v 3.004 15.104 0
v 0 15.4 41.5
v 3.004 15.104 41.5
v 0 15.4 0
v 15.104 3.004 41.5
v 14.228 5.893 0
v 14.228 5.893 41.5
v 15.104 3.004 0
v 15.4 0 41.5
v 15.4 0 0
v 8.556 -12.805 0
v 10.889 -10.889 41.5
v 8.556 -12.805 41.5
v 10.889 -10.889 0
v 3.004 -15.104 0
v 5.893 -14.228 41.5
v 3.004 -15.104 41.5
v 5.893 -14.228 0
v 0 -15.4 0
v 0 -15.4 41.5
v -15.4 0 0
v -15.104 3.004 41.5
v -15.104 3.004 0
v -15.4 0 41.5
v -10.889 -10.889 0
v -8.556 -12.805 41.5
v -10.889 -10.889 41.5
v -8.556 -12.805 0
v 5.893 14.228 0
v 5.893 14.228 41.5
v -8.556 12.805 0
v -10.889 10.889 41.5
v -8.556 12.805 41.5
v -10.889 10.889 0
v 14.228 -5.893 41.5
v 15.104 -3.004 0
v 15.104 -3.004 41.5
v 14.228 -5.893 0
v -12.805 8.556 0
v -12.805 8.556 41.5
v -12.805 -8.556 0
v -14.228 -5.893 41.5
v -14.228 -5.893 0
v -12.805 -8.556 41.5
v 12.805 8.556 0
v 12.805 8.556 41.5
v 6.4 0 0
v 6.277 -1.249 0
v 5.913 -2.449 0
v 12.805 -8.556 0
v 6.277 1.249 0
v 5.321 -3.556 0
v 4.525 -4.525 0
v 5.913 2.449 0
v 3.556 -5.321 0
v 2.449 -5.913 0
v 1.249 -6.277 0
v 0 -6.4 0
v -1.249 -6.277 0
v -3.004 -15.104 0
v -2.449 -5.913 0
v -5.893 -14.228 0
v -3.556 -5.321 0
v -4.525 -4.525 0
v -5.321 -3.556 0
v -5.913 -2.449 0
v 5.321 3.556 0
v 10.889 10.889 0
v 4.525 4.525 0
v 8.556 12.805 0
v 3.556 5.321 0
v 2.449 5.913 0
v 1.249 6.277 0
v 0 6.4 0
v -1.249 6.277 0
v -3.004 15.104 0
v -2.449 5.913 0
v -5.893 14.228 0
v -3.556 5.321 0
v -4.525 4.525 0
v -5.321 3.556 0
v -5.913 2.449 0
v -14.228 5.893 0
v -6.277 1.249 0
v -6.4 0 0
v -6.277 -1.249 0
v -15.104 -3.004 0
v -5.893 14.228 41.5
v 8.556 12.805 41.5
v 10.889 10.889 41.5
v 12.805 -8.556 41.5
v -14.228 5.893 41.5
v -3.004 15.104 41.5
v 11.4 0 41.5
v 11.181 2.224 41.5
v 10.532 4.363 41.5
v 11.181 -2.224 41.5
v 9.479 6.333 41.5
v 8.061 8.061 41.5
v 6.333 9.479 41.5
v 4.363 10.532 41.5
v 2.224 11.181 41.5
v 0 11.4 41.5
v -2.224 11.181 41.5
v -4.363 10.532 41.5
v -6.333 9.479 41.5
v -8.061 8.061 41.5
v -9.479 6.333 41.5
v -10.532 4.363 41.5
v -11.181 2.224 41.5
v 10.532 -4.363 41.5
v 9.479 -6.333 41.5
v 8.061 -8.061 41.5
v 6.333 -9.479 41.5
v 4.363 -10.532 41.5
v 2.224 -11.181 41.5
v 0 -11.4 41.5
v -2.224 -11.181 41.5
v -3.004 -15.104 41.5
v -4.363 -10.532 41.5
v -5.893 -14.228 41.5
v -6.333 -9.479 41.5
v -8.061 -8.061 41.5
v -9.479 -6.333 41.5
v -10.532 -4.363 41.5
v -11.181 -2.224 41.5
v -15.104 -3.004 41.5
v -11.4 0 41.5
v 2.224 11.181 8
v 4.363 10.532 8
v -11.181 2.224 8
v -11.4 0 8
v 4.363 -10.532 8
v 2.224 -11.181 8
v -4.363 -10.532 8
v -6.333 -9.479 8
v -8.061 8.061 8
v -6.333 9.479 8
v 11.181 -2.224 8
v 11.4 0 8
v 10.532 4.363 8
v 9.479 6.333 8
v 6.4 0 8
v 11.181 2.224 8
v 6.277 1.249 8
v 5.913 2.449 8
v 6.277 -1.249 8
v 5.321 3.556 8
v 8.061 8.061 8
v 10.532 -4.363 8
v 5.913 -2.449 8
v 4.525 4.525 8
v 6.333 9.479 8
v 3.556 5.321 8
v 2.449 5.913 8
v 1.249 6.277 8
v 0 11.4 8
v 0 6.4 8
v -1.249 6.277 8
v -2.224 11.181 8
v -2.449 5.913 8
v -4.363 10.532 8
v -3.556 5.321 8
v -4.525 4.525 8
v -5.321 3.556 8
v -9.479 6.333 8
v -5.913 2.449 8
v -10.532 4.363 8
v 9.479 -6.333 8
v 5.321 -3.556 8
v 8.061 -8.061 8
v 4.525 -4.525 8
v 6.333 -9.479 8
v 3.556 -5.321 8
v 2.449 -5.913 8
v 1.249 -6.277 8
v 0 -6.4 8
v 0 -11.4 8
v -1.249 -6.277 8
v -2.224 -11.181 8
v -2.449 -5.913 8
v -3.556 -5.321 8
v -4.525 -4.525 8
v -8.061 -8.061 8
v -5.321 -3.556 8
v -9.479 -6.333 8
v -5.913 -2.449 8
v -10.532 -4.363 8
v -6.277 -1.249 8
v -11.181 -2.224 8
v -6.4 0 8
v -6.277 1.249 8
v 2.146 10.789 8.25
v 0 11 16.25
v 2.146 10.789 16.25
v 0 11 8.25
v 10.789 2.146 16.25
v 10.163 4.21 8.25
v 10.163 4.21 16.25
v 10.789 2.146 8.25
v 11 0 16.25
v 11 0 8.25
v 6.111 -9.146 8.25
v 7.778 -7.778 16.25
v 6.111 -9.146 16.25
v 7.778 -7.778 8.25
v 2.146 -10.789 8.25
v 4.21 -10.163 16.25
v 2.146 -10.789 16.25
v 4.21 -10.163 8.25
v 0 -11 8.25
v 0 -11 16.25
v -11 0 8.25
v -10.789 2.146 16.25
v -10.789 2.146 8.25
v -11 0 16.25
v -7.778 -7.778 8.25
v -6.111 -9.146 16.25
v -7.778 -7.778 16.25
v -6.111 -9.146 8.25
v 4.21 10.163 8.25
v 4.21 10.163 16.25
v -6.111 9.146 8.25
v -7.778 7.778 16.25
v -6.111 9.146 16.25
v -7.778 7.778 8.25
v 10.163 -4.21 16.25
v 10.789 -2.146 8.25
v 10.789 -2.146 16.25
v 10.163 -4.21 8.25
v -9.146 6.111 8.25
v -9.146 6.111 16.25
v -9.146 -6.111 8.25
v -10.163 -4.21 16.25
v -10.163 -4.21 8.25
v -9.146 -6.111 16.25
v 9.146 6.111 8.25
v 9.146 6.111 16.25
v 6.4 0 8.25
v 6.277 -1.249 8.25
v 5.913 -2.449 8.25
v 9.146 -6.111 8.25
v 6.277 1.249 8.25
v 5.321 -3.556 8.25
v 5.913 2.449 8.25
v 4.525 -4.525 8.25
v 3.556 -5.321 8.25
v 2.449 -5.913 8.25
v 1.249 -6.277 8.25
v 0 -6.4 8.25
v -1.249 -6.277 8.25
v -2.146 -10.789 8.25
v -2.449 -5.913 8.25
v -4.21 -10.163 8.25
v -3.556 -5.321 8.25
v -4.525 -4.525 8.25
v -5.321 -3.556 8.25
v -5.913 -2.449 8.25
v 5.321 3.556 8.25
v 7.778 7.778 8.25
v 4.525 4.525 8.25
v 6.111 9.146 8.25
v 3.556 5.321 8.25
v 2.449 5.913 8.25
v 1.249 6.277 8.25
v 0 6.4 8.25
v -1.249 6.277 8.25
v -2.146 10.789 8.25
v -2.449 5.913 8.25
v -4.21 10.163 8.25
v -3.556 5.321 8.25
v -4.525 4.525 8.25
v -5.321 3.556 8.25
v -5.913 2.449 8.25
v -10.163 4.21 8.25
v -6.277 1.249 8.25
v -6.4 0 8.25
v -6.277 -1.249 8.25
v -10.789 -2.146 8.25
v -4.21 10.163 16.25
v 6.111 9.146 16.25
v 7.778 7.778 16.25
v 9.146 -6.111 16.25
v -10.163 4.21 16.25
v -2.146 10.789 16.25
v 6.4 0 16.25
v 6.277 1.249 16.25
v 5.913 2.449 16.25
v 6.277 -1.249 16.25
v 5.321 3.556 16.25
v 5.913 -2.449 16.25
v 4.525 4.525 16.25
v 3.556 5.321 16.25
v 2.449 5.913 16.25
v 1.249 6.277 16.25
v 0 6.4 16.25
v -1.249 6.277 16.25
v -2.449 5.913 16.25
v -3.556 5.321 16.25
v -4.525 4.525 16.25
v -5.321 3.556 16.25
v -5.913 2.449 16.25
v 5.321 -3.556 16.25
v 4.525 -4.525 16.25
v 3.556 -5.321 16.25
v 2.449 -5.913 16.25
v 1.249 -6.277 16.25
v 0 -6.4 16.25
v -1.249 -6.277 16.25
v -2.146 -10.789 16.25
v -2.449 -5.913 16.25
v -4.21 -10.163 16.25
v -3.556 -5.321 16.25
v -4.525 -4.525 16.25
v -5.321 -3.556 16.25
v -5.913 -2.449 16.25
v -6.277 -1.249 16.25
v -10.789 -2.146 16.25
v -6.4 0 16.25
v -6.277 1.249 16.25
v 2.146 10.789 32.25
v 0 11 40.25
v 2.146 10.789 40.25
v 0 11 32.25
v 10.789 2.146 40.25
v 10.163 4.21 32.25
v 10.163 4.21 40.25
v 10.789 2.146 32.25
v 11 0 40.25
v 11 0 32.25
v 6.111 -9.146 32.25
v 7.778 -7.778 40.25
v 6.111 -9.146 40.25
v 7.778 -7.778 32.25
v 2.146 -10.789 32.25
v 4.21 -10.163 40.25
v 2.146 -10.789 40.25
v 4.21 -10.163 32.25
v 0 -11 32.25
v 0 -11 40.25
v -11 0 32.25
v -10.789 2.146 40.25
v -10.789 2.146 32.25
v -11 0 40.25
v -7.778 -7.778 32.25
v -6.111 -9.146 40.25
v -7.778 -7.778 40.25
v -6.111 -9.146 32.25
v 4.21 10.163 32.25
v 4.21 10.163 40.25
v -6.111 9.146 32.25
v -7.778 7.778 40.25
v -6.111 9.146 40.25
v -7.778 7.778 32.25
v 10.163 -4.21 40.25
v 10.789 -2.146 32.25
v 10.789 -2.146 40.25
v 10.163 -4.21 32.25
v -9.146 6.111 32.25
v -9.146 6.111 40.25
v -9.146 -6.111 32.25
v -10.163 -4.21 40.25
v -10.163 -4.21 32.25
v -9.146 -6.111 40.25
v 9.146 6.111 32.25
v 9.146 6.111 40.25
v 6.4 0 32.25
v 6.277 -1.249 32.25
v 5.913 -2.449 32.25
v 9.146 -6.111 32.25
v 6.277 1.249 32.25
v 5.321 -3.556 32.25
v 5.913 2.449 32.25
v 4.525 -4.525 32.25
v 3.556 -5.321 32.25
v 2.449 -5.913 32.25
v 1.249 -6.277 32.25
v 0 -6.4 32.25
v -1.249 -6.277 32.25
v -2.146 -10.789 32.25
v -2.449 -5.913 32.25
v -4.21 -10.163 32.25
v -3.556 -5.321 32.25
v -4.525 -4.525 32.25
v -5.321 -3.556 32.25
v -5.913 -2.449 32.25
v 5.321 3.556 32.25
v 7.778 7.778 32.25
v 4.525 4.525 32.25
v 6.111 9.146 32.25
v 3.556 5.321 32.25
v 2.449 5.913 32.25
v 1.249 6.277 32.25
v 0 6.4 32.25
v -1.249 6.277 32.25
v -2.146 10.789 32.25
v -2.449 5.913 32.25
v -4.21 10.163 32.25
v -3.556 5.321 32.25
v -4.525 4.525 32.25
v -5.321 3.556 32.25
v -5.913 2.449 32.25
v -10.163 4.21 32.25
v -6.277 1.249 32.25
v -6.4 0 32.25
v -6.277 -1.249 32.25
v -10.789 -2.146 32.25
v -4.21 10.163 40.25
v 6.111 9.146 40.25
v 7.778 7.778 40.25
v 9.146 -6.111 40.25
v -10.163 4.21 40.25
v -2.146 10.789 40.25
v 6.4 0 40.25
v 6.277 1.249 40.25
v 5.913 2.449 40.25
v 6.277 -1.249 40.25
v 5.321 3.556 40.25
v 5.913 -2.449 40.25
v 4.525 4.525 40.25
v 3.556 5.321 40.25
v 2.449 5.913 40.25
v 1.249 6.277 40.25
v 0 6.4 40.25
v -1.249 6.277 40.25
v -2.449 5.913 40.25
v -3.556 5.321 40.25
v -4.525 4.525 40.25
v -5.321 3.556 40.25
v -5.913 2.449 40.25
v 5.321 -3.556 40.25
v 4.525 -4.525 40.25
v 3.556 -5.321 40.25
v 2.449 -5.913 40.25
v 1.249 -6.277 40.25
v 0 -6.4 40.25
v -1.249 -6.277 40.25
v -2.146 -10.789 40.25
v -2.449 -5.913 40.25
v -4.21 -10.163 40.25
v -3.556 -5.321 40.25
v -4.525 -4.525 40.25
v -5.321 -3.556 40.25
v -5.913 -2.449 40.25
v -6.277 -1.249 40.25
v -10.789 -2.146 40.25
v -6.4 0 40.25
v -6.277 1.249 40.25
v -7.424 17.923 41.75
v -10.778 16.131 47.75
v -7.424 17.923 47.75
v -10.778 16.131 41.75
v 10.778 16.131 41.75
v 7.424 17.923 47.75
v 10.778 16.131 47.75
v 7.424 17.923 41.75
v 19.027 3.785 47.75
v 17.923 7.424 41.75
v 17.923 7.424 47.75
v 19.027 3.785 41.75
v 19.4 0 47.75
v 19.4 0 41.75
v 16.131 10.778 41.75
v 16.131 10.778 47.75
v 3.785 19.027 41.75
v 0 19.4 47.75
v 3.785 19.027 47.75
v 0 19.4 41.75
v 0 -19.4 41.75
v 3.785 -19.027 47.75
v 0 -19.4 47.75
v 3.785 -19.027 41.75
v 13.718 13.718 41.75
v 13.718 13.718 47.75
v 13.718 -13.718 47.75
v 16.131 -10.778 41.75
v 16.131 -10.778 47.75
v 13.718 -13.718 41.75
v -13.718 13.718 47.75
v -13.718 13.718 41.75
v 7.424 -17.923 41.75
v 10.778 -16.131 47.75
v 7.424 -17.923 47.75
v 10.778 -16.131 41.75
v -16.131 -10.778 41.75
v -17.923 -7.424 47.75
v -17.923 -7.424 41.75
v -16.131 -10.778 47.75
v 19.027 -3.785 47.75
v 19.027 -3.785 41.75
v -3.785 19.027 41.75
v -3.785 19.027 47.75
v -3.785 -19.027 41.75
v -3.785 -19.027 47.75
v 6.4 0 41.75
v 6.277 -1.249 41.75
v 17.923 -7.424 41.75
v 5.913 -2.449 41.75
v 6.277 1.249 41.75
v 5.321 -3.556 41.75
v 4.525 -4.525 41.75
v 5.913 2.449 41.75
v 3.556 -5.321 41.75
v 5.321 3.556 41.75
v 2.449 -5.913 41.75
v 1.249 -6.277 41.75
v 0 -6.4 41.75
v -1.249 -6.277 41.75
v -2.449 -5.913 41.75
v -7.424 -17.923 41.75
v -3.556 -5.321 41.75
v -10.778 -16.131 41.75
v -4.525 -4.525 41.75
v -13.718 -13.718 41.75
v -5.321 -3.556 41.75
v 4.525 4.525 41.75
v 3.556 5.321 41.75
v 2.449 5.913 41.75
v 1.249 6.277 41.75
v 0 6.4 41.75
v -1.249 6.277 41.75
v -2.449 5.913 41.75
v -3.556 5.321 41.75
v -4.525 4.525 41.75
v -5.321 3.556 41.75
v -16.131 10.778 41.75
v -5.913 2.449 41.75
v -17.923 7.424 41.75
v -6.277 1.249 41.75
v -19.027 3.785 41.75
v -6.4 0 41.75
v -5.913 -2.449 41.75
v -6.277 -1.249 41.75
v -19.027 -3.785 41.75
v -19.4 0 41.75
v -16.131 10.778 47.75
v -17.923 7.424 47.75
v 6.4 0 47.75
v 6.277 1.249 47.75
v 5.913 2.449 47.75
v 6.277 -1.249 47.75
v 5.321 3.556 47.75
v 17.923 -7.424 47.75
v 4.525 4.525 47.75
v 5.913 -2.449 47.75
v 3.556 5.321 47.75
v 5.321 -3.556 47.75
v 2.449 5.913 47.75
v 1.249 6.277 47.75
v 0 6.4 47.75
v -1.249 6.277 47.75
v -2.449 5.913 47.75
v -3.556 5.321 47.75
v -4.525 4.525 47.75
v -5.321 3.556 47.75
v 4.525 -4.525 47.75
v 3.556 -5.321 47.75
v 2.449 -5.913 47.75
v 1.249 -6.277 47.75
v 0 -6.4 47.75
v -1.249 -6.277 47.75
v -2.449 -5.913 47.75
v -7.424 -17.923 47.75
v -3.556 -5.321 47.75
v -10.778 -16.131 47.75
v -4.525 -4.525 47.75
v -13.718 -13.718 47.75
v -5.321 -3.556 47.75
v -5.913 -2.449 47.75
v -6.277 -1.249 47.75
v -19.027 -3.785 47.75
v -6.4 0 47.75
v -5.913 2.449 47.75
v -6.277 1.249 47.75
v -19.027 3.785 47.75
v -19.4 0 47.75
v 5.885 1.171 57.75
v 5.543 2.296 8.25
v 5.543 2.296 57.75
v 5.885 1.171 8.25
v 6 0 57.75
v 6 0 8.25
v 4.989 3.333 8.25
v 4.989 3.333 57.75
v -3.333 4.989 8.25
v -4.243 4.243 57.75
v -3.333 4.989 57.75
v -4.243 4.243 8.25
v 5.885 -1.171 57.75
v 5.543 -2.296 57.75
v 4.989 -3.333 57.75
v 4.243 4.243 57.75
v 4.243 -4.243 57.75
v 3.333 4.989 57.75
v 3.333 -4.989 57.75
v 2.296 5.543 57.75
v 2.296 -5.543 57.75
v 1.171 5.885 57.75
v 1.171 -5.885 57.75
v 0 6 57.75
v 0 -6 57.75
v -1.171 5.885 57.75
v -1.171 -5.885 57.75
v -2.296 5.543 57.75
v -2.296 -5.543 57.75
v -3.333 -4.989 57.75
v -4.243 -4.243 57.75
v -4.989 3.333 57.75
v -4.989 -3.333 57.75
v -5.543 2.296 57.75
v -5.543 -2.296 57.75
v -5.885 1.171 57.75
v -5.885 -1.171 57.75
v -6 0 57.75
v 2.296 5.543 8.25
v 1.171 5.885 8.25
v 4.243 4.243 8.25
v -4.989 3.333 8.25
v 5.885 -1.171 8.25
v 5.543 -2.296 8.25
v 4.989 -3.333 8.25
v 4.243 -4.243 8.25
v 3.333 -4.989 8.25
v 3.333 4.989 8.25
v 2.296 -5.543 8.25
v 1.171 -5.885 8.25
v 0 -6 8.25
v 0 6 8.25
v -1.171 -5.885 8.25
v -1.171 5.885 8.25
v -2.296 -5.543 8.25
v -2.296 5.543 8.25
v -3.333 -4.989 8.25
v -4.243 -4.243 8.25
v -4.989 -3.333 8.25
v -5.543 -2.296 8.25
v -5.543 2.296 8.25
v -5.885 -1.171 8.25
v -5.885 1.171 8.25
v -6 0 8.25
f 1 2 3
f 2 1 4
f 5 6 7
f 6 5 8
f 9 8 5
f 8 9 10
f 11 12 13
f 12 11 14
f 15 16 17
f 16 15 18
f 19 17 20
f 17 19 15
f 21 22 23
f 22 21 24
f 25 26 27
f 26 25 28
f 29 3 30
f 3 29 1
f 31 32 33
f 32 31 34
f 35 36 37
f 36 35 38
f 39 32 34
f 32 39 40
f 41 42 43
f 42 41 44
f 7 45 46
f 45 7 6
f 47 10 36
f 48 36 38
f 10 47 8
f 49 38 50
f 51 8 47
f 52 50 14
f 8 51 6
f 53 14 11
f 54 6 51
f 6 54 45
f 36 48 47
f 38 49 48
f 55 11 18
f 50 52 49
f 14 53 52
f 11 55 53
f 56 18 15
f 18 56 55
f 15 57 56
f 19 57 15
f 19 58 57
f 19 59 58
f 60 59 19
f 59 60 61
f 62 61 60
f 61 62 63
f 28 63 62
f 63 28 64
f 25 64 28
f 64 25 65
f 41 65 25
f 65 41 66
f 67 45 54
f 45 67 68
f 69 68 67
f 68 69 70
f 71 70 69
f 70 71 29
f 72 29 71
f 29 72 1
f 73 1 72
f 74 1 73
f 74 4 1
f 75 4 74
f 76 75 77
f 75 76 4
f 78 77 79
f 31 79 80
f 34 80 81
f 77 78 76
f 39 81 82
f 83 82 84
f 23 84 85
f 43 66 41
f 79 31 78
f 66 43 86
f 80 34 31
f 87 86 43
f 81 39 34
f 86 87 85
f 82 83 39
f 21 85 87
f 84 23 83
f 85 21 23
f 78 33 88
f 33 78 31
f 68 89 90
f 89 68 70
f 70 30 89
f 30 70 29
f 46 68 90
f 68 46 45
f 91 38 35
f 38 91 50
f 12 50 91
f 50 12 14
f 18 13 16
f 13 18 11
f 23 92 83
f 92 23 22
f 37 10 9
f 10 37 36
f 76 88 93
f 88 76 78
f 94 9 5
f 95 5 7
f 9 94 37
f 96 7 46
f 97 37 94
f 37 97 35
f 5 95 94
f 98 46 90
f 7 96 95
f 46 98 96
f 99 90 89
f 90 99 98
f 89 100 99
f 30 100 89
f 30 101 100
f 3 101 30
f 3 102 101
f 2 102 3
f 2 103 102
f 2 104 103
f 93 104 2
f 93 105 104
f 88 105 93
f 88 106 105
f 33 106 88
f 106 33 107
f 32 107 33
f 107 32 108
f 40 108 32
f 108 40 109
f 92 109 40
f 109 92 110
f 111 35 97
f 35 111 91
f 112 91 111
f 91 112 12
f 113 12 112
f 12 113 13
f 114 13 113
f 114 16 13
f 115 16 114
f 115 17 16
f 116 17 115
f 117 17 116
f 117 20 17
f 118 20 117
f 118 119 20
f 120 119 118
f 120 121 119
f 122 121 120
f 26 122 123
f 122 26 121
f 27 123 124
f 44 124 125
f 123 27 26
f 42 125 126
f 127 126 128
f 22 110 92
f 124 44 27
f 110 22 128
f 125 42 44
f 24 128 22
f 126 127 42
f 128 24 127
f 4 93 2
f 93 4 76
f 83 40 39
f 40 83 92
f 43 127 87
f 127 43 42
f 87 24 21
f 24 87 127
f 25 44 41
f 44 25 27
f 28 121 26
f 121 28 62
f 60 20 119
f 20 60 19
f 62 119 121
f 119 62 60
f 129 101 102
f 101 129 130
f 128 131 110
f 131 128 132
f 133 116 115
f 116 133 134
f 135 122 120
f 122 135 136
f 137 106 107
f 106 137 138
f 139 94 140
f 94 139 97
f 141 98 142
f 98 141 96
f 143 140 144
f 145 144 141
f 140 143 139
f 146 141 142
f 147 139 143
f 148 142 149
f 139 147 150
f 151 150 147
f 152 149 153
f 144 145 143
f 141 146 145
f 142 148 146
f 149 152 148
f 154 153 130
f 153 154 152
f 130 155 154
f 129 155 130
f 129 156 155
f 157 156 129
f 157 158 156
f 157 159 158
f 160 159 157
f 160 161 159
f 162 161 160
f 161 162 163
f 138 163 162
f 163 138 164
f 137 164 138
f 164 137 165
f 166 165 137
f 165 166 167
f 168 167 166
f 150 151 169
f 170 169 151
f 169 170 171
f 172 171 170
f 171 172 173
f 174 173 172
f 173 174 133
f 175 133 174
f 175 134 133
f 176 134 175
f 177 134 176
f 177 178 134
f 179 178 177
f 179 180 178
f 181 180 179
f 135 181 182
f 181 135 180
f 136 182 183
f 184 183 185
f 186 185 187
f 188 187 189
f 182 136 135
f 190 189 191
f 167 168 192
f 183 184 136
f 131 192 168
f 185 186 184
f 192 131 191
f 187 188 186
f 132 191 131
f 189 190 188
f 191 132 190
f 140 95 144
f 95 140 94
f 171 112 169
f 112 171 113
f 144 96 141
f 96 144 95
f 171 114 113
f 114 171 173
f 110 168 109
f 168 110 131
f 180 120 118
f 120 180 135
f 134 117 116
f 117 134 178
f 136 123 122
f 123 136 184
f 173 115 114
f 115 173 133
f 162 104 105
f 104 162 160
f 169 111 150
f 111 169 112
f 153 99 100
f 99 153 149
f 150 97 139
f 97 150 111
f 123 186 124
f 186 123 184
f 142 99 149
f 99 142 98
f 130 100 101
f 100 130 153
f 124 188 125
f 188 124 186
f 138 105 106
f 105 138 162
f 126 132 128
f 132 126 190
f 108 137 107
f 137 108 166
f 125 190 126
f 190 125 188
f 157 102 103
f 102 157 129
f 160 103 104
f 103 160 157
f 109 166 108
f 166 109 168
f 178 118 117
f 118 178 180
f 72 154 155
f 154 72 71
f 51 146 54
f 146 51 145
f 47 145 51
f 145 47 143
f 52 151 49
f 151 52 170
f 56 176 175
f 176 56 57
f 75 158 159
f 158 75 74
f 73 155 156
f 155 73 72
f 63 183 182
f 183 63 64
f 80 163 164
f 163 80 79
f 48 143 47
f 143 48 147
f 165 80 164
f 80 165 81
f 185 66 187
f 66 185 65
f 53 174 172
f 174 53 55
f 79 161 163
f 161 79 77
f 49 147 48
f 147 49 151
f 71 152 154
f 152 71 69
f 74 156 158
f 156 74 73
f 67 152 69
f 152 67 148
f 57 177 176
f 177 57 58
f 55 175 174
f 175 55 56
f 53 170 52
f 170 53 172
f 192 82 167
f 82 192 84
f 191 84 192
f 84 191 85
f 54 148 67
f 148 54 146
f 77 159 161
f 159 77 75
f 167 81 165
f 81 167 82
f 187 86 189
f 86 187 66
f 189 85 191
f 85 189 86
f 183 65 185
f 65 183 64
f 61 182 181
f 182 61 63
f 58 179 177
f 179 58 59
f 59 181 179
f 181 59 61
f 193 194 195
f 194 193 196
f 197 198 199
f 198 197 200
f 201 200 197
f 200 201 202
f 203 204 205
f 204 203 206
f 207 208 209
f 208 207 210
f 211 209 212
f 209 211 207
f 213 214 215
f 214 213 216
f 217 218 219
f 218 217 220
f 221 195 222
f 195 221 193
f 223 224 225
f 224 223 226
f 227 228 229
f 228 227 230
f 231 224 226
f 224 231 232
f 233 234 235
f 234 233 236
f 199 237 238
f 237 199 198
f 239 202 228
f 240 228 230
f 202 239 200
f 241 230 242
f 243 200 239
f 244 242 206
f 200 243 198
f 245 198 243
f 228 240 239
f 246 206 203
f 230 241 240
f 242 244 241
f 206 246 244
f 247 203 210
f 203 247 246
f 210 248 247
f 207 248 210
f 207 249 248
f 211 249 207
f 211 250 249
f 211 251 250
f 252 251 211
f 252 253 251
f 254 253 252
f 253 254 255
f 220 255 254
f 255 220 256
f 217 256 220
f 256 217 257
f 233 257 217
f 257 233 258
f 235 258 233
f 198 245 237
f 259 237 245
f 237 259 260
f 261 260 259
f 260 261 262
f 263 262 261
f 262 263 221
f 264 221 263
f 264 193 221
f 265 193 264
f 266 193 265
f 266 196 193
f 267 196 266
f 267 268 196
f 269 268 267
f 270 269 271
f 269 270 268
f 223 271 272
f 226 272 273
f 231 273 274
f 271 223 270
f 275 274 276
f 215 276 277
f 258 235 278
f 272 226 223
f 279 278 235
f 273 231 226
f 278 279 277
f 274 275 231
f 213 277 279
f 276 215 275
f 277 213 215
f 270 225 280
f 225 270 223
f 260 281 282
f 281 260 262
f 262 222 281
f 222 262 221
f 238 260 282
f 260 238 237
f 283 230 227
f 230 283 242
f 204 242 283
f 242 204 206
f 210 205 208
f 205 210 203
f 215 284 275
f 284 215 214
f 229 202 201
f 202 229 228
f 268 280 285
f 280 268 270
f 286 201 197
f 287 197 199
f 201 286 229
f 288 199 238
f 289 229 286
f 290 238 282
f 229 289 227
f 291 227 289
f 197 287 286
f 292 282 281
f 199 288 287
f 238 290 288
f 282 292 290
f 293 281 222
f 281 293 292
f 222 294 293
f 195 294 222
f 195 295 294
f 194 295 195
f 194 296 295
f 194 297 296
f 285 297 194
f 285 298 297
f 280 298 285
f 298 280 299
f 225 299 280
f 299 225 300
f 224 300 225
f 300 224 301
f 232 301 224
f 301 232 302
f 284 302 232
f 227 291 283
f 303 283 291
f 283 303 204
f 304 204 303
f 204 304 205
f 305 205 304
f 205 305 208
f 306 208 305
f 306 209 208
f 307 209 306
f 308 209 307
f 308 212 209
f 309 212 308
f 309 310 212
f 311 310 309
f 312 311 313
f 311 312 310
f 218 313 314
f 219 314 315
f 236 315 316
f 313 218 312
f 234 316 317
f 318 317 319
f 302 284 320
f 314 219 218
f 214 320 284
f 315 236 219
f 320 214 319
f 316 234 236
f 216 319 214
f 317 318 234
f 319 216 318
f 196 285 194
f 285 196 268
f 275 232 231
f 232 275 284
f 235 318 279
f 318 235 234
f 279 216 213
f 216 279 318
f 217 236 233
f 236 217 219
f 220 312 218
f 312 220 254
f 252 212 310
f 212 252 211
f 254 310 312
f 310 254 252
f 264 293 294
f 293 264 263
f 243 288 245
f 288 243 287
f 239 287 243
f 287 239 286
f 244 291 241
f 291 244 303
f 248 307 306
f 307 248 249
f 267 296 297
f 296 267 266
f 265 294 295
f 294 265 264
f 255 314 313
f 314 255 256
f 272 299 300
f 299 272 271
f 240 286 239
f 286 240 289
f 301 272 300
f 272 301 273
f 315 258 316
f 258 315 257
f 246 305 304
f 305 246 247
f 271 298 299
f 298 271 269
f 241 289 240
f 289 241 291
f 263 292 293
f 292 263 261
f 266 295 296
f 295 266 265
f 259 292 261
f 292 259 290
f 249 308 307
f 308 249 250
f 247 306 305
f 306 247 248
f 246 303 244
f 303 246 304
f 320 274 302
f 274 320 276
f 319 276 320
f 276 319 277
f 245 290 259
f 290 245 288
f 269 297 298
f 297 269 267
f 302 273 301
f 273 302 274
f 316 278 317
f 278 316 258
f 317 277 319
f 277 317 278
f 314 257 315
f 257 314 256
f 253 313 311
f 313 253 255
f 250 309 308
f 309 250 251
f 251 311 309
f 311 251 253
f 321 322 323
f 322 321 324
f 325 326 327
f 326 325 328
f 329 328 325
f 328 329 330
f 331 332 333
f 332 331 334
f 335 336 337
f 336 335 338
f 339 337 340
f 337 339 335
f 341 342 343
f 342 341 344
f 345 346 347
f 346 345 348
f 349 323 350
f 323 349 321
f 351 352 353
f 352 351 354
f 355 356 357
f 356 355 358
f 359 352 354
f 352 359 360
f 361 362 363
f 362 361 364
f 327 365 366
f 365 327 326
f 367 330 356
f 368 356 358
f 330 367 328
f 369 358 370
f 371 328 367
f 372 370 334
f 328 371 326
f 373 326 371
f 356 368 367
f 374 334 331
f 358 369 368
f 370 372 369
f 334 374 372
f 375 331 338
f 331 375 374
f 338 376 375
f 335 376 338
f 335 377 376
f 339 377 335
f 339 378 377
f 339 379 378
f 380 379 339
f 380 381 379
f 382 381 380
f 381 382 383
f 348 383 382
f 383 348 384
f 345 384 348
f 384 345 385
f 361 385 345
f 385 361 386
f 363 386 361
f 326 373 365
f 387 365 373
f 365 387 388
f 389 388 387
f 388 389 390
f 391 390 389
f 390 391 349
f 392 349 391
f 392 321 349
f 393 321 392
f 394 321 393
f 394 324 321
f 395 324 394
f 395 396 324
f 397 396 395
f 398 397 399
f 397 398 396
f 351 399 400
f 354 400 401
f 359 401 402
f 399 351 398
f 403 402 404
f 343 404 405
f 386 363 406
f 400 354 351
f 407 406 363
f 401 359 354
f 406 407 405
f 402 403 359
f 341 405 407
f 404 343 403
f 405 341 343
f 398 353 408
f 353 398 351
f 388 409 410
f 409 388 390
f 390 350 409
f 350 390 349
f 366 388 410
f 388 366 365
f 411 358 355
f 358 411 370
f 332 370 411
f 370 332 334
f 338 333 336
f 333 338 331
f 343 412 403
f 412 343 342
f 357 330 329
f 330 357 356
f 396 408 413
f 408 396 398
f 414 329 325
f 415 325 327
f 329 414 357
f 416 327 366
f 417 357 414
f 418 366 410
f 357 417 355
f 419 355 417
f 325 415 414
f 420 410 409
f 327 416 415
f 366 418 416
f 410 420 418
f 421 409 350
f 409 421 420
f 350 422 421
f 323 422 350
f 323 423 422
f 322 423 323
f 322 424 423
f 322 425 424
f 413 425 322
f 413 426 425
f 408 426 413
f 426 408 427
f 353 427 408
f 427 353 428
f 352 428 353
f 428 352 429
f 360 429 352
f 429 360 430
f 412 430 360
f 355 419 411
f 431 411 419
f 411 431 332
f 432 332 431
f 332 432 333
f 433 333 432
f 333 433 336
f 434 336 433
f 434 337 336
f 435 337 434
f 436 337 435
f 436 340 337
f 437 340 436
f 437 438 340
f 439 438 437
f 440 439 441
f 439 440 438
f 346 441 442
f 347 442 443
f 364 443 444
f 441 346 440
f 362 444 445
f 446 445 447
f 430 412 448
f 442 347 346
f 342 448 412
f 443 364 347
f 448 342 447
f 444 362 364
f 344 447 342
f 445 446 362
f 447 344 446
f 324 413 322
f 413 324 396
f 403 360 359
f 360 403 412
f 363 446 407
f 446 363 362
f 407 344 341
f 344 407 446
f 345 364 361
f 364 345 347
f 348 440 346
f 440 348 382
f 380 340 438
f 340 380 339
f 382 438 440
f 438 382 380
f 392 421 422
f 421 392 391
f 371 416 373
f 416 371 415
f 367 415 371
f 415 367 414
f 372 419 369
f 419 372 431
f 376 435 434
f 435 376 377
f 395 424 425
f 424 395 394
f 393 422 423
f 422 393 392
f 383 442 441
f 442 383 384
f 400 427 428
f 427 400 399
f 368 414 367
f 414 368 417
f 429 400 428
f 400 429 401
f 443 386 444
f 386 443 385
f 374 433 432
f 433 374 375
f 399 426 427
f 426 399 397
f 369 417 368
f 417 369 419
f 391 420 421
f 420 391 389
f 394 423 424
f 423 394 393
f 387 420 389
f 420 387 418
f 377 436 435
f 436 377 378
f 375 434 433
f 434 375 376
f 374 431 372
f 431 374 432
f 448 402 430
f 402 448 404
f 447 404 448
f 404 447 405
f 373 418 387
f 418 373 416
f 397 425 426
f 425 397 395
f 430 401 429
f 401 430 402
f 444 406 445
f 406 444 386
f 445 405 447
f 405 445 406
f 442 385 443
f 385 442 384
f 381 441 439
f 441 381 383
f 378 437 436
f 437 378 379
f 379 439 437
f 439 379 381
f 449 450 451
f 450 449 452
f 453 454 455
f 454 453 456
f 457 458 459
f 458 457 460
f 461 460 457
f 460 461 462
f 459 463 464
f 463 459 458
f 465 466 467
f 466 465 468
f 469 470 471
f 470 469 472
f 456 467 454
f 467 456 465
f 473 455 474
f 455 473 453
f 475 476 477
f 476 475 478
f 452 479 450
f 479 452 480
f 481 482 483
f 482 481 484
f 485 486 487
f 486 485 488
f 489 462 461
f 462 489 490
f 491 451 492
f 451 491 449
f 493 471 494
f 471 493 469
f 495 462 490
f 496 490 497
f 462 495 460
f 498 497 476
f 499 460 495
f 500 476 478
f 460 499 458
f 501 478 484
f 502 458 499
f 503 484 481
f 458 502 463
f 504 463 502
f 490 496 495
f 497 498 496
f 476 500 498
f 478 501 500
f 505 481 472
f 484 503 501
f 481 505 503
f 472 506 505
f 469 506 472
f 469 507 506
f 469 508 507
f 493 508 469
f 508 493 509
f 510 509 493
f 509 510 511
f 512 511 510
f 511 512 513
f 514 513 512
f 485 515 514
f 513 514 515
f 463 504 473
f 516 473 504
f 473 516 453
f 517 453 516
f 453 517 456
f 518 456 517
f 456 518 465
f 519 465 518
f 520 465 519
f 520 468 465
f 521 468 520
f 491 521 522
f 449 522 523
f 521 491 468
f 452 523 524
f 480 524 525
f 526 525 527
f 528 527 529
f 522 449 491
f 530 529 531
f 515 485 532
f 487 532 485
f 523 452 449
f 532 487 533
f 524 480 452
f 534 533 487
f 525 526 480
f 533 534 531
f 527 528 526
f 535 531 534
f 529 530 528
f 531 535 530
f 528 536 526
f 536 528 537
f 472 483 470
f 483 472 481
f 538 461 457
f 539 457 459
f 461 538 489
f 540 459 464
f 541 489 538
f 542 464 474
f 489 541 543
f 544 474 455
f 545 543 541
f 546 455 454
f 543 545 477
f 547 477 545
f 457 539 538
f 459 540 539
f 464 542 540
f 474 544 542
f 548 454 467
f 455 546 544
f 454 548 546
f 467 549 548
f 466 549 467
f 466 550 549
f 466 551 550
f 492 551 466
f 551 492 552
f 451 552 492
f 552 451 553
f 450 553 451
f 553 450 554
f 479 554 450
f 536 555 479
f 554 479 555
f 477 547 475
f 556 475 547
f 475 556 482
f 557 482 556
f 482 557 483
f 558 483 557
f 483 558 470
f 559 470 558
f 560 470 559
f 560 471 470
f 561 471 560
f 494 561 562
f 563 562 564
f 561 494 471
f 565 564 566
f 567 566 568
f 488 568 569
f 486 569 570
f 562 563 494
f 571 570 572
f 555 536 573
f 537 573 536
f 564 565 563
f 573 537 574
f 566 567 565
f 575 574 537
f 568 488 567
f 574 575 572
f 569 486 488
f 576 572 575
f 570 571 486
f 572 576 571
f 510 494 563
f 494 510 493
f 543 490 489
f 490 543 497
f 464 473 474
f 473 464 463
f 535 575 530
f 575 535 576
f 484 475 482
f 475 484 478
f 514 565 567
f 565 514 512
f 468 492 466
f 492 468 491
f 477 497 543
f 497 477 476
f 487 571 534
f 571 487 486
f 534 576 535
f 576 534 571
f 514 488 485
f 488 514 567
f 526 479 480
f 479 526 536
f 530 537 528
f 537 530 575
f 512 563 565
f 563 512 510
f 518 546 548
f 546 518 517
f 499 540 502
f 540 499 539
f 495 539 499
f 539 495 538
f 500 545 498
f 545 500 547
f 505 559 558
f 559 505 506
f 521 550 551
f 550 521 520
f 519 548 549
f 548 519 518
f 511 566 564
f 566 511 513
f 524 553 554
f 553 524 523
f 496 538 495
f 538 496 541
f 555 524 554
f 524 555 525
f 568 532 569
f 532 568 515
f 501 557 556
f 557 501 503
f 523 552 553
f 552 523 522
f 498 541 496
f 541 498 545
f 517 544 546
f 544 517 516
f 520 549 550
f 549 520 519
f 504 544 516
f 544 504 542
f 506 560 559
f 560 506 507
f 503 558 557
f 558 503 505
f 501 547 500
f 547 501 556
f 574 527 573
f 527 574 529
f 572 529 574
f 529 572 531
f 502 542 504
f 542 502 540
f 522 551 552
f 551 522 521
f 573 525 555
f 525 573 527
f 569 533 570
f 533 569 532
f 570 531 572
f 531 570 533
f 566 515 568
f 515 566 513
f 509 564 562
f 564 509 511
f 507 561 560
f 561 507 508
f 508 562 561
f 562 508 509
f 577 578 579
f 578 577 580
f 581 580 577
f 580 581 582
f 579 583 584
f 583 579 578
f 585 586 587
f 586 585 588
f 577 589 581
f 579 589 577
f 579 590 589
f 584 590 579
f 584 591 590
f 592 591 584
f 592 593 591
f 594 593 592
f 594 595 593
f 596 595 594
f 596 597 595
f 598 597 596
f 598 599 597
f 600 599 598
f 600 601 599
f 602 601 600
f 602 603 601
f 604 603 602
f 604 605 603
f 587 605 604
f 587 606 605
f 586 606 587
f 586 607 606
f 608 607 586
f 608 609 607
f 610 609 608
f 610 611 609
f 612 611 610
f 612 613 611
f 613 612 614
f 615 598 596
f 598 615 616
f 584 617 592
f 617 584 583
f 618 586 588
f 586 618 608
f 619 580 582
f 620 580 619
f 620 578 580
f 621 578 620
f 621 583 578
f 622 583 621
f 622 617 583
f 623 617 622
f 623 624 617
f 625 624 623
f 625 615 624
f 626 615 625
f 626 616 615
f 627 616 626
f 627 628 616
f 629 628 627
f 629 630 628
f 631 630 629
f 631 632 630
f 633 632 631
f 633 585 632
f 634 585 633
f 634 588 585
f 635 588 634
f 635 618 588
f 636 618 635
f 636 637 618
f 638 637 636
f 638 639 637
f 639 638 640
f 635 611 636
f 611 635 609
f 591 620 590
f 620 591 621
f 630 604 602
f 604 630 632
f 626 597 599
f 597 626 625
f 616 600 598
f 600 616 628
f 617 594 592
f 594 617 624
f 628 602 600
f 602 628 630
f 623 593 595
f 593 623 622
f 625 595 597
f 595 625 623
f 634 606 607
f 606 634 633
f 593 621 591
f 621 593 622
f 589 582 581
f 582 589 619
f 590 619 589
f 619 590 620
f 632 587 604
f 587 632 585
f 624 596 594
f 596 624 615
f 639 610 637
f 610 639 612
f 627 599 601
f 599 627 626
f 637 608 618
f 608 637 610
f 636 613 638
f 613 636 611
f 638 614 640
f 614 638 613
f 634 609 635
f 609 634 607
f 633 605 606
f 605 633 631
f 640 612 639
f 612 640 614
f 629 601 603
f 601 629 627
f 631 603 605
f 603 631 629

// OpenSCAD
$fn = 32;

// ------------------------------------------------------------------------
// Shaft station: cup d30.8 x 41.5 mm, shaft d12
// Every part is its own module, assembly() places every instance.
// ------------------------------------------------------------------------

// --- part 1 ---
module housing_cup() {
  difference() {
    cylinder(h = 41.5, d = 30.8);
    translate([0, 0, 8]) cylinder(h = 34.5, d = 22.8);
    translate([0, 0, -1]) cylinder(h = 10, d = 12.8);
  }
}

// --- part 2 ---
module bearing_lower() {
  difference() {
      translate([0, 0, 0]) cylinder(h = 8, d = 22);
      translate([0, 0, -1]) cylinder(h = 10, d = 12.8);
    }
}

// --- part 3 ---
module bearing_upper() {
  difference() {
      translate([0, 0, 0]) cylinder(h = 8, d = 22);
      translate([0, 0, -1]) cylinder(h = 10, d = 12.8);
    }
}

// --- part 4 ---
module station_shaft() {
  translate([0, 0, -24.75]) cylinder(h = 49.5, d = 12);
}

// --- part 5 ---
module station_cover() {
  difference() {
    cylinder(h = 6, d = 38.8);
    translate([0, 0, -1]) cylinder(h = 8, d = 12.8);
  }
}

// --- assembly ---
module assembly() {
  color([0.80, 0.24, 0.20]) translate([0, 0, 0]) rotate([0, 0, 0]) housing_cup();
  color([0.20, 0.45, 0.75]) translate([0, 0, 8.25]) rotate([0, 0, 0]) bearing_lower();
  color([0.25, 0.62, 0.32]) translate([0, 0, 32.25]) rotate([0, 0, 0]) bearing_upper();
  color([0.92, 0.70, 0.18]) translate([0, 0, 33]) rotate([0, 0, 0]) station_shaft();
  color([0.58, 0.35, 0.70]) translate([0, 0, 41.75]) rotate([0, 0, 0]) station_cover();
}

assembly();
